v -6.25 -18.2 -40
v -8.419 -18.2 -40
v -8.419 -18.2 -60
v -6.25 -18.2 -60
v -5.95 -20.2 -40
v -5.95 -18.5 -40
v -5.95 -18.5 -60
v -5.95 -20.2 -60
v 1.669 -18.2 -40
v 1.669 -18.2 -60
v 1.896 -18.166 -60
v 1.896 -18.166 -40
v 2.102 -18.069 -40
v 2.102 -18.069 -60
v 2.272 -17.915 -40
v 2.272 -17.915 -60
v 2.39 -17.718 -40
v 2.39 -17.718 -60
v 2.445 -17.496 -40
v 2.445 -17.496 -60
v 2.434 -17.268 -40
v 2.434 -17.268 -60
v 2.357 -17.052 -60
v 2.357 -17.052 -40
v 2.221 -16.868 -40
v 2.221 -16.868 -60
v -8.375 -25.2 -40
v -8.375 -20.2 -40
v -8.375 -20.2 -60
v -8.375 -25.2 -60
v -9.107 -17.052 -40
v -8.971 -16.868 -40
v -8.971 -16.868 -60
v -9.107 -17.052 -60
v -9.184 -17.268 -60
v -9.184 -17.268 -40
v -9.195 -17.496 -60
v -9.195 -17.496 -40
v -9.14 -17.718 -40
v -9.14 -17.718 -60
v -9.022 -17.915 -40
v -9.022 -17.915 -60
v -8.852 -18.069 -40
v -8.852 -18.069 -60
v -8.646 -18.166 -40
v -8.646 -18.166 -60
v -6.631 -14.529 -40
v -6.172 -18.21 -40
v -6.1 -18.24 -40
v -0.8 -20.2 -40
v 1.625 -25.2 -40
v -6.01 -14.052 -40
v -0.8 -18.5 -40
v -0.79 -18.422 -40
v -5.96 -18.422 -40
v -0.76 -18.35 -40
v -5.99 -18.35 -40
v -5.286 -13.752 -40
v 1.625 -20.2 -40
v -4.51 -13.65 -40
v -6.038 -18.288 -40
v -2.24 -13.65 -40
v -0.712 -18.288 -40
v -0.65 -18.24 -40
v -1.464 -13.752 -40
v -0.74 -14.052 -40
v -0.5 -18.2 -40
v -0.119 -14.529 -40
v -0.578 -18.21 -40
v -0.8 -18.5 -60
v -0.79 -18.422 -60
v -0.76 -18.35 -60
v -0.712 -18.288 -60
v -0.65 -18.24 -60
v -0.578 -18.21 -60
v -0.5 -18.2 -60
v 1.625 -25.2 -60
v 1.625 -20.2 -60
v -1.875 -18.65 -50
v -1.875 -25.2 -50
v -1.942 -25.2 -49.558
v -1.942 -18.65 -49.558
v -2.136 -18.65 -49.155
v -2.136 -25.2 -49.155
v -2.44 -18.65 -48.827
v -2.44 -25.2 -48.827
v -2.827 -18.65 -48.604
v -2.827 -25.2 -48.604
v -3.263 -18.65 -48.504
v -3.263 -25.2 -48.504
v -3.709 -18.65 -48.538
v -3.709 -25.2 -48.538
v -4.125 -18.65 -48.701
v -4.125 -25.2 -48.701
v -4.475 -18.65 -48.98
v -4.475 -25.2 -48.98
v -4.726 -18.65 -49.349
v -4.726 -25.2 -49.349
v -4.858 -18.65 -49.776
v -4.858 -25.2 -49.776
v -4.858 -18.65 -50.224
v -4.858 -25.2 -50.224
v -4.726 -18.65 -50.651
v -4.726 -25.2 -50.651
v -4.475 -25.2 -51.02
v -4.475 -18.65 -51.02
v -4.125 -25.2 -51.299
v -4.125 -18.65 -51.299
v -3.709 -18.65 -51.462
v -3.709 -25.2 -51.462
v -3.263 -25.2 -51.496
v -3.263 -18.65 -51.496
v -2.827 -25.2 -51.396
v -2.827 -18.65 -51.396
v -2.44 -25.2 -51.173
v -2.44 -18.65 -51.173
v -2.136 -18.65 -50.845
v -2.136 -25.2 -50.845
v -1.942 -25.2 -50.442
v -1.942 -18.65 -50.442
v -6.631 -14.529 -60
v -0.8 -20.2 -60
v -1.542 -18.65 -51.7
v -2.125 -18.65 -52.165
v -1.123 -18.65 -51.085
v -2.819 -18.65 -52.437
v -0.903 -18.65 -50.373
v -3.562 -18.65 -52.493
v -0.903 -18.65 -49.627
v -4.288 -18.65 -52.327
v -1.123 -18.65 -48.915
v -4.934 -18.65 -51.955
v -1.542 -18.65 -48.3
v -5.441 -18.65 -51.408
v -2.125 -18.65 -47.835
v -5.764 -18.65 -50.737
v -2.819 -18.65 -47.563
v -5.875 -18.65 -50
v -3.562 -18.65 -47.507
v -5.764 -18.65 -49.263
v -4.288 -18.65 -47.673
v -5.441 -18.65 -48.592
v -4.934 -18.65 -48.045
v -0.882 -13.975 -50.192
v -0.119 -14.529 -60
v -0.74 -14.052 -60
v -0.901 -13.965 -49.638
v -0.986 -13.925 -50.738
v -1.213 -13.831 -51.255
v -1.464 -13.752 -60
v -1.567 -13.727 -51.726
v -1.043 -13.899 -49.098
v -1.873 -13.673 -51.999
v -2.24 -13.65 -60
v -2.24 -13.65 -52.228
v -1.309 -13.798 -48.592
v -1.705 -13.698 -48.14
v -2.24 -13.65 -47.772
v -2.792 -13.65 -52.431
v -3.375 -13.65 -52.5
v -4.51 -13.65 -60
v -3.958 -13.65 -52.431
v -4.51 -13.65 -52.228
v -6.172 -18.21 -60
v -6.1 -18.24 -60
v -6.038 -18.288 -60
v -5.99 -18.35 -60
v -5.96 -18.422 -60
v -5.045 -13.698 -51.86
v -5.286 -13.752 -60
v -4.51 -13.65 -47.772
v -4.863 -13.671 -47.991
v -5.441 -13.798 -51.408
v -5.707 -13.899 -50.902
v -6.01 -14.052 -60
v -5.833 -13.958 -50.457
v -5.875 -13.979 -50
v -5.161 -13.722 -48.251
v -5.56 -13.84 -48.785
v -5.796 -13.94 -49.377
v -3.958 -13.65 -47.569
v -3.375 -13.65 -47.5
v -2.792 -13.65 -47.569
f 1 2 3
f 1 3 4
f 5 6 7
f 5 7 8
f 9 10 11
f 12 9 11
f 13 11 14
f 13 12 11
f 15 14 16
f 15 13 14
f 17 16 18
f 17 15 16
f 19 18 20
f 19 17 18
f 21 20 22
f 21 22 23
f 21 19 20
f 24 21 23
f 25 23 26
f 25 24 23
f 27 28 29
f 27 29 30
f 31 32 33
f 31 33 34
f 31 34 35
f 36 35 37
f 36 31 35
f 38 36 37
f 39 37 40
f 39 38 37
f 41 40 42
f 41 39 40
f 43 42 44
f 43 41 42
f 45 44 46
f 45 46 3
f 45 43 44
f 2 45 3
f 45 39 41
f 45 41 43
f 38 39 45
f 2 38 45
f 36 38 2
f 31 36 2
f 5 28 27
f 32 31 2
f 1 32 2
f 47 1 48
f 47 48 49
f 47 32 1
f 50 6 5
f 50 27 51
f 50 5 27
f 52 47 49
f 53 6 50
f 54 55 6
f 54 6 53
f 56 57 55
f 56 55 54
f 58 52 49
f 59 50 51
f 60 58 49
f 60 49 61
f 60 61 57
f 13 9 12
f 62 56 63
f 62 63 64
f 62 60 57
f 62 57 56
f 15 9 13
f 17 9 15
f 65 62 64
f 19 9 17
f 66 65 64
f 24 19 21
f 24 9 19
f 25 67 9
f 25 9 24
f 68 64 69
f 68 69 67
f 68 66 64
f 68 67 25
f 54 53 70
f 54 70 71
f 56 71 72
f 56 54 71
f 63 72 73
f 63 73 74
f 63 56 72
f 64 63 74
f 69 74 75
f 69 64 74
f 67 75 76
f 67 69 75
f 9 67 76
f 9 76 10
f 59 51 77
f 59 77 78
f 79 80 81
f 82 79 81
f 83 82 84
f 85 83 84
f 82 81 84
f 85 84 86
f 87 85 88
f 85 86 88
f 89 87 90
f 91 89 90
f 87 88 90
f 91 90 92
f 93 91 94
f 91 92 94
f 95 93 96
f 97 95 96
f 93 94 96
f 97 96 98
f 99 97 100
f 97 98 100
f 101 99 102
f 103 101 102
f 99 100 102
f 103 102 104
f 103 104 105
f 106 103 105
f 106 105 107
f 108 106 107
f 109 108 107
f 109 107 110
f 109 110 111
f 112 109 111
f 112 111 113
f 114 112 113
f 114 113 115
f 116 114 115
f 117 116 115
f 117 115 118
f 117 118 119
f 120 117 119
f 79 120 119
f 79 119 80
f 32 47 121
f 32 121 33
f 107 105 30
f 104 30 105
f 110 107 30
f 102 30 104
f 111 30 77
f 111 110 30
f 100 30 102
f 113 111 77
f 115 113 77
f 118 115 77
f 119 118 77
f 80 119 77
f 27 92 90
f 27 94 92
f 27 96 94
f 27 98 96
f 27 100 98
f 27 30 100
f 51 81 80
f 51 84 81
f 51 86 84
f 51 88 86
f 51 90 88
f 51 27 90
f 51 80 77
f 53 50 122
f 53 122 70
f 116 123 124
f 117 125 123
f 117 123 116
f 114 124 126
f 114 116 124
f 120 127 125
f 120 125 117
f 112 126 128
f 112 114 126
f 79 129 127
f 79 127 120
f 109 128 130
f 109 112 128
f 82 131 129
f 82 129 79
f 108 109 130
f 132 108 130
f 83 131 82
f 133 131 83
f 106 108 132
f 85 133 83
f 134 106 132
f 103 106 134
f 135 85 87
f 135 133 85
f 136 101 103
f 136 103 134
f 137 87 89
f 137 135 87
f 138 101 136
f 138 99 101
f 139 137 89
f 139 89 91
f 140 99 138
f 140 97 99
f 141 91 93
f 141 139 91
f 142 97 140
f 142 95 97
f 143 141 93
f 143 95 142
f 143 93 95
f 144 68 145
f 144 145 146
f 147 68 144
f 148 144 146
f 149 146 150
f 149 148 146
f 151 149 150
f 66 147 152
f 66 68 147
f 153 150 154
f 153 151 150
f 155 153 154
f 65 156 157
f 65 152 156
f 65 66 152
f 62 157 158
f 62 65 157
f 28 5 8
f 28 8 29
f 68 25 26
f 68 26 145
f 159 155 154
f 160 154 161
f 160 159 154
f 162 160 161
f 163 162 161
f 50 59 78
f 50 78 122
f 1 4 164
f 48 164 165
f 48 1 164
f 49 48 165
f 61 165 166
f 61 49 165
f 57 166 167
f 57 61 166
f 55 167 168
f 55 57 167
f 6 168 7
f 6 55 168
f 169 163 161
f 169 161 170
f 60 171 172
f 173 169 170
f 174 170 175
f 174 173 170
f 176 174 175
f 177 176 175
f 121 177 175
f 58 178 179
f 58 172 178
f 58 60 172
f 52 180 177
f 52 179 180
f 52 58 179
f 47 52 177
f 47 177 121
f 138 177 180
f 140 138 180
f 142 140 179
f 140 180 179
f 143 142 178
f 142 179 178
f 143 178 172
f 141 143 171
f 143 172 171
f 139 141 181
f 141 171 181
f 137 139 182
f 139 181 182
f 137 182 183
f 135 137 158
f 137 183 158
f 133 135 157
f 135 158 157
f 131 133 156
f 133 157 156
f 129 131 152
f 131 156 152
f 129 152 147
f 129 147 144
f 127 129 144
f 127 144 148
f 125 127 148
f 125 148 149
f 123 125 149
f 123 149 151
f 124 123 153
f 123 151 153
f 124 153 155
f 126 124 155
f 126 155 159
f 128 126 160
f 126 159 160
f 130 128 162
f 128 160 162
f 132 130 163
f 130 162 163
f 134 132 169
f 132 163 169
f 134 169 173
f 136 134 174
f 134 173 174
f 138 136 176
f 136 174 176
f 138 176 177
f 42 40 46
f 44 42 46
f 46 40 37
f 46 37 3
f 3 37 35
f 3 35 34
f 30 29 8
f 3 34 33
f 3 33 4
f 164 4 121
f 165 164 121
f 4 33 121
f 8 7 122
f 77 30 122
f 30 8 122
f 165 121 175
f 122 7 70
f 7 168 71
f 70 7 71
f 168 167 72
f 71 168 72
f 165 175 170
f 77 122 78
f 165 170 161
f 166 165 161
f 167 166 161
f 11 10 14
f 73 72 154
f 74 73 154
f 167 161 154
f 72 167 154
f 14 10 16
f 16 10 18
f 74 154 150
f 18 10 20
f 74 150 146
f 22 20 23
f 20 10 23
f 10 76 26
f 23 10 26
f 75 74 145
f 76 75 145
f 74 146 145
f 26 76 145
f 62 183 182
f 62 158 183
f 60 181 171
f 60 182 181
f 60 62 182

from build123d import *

# Parameters (mm, degrees)
F1_DEPTH = 60
F2_R     = 1.5
F3_DEPTH = 25
F4_R     = 2.5
F5_R     = 2.5
F6_DEPTH = 5
F7_DEPTH = 40


with BuildPart() as f1:
    # F0 (on Top) → F1 (new body)
    with BuildSketch(Plane.XY):
        with BuildLine():
            Line((-0.8000000172, -20.2), (-0.8000000172, -19.2))
            Line((-0.8, -19.2), (-0.8, -18.5000007629))
            ThreePointArc((-0.8, -18.5000007629), (-0.7121320729, -18.2878687671), (-0.5000001089, -18.2000007629))
            Line((-0.5000001089, -18.2000007629), (1.6691214738, -18.1999999754))
            ThreePointArc((1.6691214738, -18.1999999754), (2.3897472802, -17.7184929218), (2.2206644799, -16.868456686))
            Line((2.2206644799, -16.868456686), (-0.1191125495, -14.5286796566))
            ThreePointArc((-0.1191125495, -14.5286796566), (-1.0923825989, -13.8783614014), (-2.2404328993, -13.6500000001))
            Line((-2.2404328993, -13.6500000001), (-4.5095671179, -13.6500000049))
            ThreePointArc((-4.5095671179, -13.6500000049), (-5.6576174116, -13.8783614085), (-6.6308874552, -14.5286796613))
            Line((-6.6308874552, -14.5286796613), (-8.970664486, -16.8684566921))
            ThreePointArc((-8.970664486, -16.8684566921), (-9.1397472858, -17.7184929288), (-8.4191214777, -18.1999999814))
            Line((-8.4191214777, -18.1999999814), (-6.2499998919, -18.2000007629))
            ThreePointArc((-6.2499998919, -18.2000007629), (-6.0378679274, -18.2878687668), (-5.95, -18.5000007629))
            Line((-5.95, -18.5000007629), (-5.95, -19.2))
            Line((-5.95, -19.2), (-5.95, -20.2))
            Line((-5.95, -20.2), (-8.3750000086, -20.2))
            Line((-8.3750000086, -20.2), (-8.3750000086, -25.2))
            Line((-8.3750000086, -25.2), (-3.3750000086, -25.2))
            Line((-3.3750000086, -25.2), (1.6249999914, -25.2))
            Line((1.6249999914, -25.2), (1.6249999914, -20.2))
            Line((1.6249999914, -20.2), (-0.8000000172, -20.2))
        make_face()
    extrude(amount=-F1_DEPTH)

    # F2 (on face) → F3 (cut)
    with BuildSketch(Plane.XZ.offset(25.2)):
        with Locations((-3.3750000086, -50)):
            Circle(F2_R)
        with Locations((-3.3750000086, -30)):
            Circle(F2_R)
        with Locations((-3.3750000086, -10)):
            Circle(F2_R)
    extrude(amount=-F3_DEPTH, mode=Mode.SUBTRACT)

    # F4 (on face) + F5 (on face) → F6 (cut)
    with BuildSketch(Plane(origin=(2.85e-08, -13.6499999955, 0), x_dir=(-1, -2.1e-09, 0), z_dir=(-2.1e-09, 1, 0))):
        with Locations((3.3750000371, -10)):
            Circle(F4_R)
        with Locations((3.3750000371, -30)):
            Circle(F4_R)
    with BuildSketch(Plane(origin=(2.85e-08, -13.6499999955, 0), x_dir=(-1, -2.1e-09, 0), z_dir=(-2.1e-09, 1, 0))):
        with Locations((3.3750000371, -50)):
            Circle(F5_R)
    extrude(amount=-F6_DEPTH, mode=Mode.SUBTRACT)

    # F7 (cut): a face of the model
    f7_faces = [f1.faces().sort_by_distance(p)[0] for p in [
        (-3.3750000055, -19.7568505706, 0),
    ]]
    extrude(f7_faces, amount=-F7_DEPTH, mode=Mode.SUBTRACT)


solid = f1.part
